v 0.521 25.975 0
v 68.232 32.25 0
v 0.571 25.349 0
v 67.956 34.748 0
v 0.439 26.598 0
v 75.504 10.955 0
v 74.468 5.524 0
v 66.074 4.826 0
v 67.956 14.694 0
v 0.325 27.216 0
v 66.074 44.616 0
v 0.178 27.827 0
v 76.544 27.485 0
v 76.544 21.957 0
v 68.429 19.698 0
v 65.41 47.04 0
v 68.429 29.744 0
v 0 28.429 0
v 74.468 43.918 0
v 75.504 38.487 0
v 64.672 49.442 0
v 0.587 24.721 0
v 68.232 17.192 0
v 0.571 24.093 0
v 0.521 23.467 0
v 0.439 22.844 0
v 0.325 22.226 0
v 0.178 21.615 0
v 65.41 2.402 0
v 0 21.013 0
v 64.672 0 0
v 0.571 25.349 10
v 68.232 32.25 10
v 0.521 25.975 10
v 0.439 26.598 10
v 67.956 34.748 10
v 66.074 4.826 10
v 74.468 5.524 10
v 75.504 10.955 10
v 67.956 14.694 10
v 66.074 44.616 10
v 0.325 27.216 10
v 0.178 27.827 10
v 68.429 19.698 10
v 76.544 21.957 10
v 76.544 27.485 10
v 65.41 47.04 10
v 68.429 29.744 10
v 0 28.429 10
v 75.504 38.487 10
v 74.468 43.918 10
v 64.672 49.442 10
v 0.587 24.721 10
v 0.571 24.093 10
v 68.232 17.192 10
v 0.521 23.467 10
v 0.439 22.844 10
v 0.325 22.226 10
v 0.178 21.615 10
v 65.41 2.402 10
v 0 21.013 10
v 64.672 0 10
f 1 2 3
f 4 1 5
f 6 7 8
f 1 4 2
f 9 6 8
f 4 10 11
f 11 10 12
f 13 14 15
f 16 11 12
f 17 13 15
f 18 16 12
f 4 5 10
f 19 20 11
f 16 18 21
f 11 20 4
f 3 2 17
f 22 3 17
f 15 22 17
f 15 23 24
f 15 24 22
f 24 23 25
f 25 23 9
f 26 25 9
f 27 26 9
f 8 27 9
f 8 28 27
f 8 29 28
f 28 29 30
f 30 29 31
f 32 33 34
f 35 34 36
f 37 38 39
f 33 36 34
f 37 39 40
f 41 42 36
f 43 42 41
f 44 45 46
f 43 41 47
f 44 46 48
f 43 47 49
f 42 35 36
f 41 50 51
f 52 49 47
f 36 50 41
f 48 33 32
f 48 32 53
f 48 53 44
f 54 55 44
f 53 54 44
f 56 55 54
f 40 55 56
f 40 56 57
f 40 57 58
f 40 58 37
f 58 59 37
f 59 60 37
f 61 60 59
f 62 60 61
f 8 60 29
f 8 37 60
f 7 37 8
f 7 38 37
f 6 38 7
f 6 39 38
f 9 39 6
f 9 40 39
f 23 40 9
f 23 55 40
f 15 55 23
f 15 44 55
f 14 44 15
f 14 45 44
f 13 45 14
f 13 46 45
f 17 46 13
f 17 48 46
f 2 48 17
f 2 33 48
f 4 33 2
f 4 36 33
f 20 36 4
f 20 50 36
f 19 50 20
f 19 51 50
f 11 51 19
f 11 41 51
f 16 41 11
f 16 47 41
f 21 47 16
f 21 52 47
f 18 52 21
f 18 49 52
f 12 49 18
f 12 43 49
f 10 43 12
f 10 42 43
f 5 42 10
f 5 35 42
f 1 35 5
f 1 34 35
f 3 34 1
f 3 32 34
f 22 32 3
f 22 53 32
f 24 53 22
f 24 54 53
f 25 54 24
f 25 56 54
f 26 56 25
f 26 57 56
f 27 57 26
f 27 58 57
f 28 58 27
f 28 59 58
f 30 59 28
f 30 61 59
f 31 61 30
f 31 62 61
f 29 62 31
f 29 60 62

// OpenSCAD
$fn = 32;

// ----------------------------------------------------------------------
// Gear sector: 3 teeth on 36 degrees
// ----------------------------------------------------------------------

// --- parameters (mm) ---
sector_angle = 36;        // sector angle, degrees
root_r = 80;              // root circle radius
tooth_h = 8;              // tooth height over the root circle
teeth = 3;                // number of teeth on the sector
hub_r = 12;               // hub bore radius
plate_t = 10;             // sector thickness, Z
arc_step = 3;             // sampling step of the root/hub arcs, degrees

tip_r = root_r + tooth_h;  // tip circle radius

profile = [[64.672, 0], [65.41, 2.402], [66.074, 4.826], [74.468, 5.524], [75.504, 10.955], [67.956, 14.694], [68.232, 17.192], [68.429, 19.698], [76.544, 21.957], [76.544, 27.485], [68.429, 29.744], [68.232, 32.25], [67.956, 34.748], [75.504, 38.487], [74.468, 43.918], [66.074, 44.616], [65.41, 47.04], [64.672, 49.442], [0, 28.429], [0.178, 27.827], [0.325, 27.216], [0.439, 26.598], [0.521, 25.975], [0.571, 25.349], [0.587, 24.721], [0.571, 24.093], [0.521, 23.467], [0.439, 22.844], [0.325, 22.226], [0.178, 21.615], [0, 21.013]];  // primary outline, 31 points, counter clockwise

// --- the one profile operation ---
linear_extrude(height = plate_t) polygon(points = profile);
